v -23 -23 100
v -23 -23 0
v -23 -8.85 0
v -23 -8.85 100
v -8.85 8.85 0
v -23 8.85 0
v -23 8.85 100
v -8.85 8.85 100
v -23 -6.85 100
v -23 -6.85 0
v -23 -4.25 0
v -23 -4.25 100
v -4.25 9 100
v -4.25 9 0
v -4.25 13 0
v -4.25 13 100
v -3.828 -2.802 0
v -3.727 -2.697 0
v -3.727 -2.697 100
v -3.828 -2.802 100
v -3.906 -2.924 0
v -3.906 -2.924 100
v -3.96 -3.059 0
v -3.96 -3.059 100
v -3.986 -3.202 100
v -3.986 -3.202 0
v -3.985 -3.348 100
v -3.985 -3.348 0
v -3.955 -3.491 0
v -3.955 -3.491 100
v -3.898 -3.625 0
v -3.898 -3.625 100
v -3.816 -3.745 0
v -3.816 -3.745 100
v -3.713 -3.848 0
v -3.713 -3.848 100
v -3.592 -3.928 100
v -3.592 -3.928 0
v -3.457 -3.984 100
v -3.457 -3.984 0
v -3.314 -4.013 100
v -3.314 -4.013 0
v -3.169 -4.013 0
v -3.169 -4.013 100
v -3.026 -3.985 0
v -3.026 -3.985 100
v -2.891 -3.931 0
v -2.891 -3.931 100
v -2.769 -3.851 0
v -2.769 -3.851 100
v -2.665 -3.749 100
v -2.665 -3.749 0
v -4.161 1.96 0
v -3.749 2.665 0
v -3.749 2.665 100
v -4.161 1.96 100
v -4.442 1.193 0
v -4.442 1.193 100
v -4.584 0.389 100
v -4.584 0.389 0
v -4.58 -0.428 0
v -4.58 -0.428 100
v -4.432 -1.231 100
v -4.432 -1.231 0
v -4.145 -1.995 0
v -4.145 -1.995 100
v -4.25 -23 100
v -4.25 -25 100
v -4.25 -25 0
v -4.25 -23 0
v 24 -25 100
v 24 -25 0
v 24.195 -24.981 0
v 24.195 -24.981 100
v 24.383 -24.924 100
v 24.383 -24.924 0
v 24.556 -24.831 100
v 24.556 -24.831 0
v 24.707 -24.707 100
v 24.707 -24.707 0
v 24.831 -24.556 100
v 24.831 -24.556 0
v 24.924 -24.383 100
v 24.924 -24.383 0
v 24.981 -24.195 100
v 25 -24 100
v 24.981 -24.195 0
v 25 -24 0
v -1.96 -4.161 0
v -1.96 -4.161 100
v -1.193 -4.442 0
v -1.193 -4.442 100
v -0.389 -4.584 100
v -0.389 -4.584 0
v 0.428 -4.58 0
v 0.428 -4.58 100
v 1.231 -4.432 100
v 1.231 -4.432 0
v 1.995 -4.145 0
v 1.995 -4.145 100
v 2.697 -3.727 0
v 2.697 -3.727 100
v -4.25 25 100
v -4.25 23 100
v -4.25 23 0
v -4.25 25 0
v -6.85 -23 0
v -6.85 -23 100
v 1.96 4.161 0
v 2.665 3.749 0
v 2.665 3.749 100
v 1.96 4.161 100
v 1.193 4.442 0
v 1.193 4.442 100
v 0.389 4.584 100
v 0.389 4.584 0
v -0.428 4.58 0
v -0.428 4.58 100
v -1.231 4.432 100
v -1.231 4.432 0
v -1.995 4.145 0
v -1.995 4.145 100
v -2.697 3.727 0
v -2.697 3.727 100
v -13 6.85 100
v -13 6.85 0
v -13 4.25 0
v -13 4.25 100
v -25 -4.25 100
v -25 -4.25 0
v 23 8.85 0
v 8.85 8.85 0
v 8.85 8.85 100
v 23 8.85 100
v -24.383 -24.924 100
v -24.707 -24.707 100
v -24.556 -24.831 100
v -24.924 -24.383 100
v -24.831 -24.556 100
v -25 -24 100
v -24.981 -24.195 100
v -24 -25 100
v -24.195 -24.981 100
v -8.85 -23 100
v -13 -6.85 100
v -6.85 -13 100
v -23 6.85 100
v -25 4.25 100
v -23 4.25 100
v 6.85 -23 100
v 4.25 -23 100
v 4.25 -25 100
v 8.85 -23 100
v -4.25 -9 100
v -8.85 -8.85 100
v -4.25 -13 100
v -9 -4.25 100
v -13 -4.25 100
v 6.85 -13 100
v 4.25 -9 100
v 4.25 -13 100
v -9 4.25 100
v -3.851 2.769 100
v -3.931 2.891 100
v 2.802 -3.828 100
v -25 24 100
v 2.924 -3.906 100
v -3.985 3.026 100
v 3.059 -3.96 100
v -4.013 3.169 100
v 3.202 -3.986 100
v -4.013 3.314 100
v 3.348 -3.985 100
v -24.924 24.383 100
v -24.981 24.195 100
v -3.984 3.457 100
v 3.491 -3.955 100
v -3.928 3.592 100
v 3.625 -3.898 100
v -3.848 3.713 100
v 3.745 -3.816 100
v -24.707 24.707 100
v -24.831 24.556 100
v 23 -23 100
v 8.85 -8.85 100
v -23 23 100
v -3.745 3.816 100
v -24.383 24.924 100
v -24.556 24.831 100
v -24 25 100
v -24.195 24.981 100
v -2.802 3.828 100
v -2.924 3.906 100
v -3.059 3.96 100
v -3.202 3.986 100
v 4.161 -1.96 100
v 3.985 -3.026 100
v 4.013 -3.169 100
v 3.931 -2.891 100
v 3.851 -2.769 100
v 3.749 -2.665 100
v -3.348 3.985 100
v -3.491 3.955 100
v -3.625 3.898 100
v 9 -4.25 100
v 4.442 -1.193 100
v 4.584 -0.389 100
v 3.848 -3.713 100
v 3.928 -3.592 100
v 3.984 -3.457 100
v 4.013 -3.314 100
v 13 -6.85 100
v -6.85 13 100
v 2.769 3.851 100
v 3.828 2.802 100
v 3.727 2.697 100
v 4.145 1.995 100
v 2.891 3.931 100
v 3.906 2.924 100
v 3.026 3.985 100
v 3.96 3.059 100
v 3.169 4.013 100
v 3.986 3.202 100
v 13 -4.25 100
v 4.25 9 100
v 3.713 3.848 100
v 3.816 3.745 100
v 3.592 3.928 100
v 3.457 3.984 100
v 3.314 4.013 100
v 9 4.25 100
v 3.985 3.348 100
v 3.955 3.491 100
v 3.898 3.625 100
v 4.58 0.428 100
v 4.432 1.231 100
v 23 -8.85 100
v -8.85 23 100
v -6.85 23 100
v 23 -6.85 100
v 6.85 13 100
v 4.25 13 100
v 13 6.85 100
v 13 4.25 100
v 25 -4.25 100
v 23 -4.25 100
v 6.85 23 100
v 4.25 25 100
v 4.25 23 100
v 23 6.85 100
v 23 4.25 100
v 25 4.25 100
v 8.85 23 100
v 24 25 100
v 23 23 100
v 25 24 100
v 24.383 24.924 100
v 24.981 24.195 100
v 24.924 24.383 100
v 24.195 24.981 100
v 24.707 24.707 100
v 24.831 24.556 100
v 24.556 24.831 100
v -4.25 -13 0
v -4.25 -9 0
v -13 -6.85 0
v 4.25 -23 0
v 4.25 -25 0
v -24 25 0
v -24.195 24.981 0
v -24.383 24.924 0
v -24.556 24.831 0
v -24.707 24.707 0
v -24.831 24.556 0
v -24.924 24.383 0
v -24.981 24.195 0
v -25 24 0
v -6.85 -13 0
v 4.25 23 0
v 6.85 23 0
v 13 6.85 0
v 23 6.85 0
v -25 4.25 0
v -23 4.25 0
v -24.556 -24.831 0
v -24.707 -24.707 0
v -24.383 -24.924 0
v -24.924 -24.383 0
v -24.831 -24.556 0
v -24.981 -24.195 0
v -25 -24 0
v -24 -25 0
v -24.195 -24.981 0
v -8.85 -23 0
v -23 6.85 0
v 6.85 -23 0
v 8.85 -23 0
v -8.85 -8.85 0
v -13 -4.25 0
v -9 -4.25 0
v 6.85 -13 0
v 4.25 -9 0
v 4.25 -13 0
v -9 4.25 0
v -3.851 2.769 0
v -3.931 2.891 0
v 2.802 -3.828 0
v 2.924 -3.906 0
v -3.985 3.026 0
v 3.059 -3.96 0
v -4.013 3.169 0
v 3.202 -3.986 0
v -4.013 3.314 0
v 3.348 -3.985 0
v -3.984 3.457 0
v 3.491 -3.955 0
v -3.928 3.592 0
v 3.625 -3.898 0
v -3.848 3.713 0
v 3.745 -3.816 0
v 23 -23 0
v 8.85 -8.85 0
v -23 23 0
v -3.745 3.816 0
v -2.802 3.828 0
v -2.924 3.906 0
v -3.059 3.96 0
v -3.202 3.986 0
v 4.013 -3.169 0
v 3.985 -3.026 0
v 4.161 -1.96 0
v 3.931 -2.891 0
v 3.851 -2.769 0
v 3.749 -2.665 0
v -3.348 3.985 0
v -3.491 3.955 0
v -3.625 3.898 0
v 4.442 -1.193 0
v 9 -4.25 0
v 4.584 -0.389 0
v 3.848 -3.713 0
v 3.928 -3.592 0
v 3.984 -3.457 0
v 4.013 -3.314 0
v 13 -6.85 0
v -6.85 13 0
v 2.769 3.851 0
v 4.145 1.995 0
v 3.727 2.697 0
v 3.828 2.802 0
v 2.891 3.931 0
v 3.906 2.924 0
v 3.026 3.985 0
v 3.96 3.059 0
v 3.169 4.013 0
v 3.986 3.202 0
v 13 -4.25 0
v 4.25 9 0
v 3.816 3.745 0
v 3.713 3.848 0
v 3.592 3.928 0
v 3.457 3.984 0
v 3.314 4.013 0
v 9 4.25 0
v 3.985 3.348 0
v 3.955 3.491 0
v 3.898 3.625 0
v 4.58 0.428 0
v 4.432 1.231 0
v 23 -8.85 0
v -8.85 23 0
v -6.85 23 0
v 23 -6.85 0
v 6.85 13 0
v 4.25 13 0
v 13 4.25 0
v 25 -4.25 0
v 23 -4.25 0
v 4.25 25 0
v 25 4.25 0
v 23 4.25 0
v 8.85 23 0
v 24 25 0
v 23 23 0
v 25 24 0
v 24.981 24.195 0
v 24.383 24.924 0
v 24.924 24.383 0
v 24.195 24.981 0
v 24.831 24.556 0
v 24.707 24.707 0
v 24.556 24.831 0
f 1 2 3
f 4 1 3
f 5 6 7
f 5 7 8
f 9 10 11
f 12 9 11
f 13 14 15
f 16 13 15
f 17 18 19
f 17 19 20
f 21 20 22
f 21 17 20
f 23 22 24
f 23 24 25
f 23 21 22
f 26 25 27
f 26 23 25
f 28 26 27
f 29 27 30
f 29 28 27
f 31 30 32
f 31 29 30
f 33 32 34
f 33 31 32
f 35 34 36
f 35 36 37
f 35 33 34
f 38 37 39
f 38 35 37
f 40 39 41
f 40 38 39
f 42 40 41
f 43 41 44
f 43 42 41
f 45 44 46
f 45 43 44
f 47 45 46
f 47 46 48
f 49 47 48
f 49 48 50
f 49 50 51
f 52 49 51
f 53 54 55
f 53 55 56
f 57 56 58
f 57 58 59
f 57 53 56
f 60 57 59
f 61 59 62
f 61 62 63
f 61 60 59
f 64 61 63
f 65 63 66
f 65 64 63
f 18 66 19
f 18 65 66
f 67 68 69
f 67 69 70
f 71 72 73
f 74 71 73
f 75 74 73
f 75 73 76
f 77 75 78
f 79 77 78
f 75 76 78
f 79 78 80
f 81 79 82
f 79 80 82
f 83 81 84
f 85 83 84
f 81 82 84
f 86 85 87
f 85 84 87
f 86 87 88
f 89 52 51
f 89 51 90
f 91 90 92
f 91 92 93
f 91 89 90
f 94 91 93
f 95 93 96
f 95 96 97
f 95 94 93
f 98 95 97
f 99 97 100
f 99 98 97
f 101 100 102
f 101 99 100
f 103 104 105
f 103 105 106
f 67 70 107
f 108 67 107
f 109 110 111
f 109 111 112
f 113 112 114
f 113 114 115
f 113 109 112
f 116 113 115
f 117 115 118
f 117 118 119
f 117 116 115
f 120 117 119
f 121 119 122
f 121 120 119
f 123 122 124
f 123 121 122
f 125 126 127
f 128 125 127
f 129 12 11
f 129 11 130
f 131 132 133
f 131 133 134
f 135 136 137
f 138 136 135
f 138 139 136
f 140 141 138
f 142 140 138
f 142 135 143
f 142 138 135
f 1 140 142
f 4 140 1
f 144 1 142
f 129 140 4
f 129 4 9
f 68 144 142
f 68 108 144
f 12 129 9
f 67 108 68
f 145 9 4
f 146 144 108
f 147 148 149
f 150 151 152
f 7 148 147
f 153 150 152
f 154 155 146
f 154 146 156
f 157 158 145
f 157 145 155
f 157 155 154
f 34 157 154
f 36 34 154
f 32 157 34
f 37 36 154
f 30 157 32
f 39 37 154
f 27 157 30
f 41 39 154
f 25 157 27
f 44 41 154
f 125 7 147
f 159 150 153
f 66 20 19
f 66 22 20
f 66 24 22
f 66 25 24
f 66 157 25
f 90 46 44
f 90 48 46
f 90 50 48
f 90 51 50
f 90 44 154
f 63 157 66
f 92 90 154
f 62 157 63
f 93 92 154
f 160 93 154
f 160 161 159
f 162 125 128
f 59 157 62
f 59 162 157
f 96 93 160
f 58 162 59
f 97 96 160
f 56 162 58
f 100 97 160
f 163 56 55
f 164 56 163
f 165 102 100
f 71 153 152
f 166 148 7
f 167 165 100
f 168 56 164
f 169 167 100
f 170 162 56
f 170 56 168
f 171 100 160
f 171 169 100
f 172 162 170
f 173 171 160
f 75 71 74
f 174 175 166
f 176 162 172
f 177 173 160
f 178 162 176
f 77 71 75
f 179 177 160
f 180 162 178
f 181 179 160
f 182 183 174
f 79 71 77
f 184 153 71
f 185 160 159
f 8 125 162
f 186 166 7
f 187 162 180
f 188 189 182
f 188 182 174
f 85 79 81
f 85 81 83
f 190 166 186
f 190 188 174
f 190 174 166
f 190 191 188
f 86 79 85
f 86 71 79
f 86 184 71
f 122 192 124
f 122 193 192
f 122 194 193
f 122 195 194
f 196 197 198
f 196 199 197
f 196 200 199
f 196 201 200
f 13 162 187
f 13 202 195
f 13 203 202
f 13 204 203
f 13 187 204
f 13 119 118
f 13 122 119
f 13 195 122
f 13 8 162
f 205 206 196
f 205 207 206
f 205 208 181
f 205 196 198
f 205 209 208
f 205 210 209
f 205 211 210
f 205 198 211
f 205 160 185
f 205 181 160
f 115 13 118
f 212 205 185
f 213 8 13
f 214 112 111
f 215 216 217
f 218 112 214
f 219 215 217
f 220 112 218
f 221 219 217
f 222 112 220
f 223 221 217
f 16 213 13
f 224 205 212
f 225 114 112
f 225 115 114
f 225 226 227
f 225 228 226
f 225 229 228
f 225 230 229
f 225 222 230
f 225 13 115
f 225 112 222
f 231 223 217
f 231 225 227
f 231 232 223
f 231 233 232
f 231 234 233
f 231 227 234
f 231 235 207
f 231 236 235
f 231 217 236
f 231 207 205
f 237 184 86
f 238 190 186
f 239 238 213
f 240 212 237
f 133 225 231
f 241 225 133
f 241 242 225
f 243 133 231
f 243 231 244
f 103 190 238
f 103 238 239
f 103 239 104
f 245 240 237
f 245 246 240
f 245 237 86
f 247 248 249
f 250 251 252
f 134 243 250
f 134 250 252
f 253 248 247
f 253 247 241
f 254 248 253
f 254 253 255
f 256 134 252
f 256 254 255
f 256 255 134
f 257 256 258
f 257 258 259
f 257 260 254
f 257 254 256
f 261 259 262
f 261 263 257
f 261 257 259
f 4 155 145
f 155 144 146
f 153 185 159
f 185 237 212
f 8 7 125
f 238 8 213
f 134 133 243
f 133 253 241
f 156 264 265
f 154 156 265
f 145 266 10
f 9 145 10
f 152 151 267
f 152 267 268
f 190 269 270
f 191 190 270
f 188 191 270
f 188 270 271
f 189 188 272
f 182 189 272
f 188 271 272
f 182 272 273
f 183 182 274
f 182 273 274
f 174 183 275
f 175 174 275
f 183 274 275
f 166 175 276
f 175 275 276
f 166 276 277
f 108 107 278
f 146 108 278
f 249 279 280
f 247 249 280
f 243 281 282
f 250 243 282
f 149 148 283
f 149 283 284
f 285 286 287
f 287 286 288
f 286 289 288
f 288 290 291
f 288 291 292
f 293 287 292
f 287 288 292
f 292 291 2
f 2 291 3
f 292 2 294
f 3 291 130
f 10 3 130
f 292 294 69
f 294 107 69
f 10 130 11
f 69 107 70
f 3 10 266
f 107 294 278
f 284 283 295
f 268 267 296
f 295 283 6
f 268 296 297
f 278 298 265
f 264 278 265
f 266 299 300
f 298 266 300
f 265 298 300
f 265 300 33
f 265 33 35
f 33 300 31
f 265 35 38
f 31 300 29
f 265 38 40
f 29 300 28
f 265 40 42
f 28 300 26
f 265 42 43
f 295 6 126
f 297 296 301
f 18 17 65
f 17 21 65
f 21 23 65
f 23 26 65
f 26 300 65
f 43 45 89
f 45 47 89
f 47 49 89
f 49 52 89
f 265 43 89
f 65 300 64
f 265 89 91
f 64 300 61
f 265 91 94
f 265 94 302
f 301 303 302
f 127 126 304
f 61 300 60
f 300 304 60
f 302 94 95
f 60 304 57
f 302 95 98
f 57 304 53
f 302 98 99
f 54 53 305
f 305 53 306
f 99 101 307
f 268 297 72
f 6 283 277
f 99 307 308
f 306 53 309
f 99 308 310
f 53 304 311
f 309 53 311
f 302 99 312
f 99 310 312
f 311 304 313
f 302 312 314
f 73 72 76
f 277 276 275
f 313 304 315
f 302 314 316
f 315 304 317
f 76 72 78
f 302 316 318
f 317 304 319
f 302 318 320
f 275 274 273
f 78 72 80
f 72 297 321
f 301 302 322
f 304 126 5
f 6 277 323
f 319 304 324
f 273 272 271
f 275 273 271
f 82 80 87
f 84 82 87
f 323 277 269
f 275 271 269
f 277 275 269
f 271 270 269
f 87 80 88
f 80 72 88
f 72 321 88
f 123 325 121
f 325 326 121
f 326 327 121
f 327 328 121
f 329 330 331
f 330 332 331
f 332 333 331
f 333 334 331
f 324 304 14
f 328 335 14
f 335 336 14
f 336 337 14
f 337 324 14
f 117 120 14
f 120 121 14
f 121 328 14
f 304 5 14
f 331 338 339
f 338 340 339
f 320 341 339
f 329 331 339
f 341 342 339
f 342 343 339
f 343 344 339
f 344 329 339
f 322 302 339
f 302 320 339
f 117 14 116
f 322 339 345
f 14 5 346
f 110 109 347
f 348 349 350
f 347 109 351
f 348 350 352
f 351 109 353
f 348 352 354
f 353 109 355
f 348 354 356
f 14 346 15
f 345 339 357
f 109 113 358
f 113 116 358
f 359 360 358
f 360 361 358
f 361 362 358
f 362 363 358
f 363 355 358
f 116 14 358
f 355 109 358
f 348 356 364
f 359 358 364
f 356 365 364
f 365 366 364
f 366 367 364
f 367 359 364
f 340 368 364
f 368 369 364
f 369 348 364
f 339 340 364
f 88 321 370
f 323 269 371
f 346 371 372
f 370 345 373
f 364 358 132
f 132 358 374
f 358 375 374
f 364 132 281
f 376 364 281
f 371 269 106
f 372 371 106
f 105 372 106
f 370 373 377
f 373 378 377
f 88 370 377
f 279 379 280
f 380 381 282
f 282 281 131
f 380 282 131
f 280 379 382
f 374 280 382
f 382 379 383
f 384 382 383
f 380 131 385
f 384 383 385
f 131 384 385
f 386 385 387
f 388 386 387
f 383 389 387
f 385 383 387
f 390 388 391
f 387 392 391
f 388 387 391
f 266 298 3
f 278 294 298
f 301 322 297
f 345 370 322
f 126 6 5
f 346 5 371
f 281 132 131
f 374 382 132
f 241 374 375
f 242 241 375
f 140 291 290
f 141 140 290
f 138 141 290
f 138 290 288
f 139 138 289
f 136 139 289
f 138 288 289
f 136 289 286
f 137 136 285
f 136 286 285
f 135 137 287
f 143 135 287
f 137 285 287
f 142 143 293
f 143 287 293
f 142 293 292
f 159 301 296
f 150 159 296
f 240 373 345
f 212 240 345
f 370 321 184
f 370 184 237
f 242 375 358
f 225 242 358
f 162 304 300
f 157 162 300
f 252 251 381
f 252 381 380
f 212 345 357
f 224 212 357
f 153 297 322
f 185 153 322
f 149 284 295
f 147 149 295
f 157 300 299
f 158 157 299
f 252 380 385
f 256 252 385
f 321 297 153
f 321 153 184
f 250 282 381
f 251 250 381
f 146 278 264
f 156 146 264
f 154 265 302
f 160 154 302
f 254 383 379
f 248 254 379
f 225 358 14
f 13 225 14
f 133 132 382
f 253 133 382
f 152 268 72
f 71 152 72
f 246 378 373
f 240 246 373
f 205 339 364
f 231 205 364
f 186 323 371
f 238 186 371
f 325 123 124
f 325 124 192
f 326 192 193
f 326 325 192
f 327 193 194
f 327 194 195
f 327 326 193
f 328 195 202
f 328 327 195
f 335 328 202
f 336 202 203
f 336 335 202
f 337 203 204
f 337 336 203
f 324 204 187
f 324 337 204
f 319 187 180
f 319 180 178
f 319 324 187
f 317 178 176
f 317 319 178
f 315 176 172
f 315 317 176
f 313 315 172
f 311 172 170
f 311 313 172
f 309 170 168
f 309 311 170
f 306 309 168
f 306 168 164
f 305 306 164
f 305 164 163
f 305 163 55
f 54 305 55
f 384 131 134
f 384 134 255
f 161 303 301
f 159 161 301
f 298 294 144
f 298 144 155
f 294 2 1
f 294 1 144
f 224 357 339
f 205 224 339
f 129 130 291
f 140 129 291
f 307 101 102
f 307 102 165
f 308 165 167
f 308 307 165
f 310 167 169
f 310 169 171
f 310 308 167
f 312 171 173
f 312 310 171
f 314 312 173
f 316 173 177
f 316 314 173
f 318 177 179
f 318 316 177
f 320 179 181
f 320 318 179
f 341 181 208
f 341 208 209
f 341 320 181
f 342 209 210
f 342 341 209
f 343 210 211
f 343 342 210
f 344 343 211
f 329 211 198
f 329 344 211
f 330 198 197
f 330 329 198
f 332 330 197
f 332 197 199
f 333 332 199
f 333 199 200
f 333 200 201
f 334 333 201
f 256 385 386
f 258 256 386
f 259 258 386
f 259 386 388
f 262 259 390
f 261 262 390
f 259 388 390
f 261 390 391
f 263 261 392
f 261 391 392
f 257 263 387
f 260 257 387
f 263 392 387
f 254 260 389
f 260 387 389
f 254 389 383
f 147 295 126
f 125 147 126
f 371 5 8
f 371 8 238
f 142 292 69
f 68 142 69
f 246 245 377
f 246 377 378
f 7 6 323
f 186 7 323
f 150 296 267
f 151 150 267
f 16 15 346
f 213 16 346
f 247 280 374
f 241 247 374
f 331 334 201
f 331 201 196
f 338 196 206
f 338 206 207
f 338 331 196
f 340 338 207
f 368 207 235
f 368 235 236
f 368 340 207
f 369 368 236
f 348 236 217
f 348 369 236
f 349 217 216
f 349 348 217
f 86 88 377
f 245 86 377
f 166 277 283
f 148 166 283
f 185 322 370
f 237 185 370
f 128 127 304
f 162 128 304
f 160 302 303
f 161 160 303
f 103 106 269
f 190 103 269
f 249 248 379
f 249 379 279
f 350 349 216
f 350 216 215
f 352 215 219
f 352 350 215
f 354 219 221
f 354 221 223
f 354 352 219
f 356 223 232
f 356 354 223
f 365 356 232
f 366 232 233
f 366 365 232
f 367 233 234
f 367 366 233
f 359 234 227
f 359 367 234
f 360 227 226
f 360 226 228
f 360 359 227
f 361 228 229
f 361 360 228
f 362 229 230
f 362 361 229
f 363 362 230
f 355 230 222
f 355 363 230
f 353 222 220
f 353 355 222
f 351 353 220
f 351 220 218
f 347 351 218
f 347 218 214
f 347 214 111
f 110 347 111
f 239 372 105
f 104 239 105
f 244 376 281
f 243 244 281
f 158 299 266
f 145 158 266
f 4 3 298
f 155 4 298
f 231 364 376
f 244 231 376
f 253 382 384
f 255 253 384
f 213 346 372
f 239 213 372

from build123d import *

# Parameters (mm, degrees)
SKETCH_1_W      = 14.15
SKETCH_1_H      = 14.15
EXTRUDE_1_DEPTH = 100


with BuildPart() as part:
    # 草图1 → 凸台-拉伸1 (new body)
    with BuildSketch(Plane.XY):
        with BuildLine():
            Line((-25, 24), (-25, 4.25))
            Line((-25, 4.25), (-23, 4.25))
            Line((-23, 4.25), (-23, 6.85))
            Line((-23, 6.85), (-13, 6.85))
            Line((-13, 6.85), (-13, 4.25))
            Line((-13, 4.25), (-9, 4.25))
            Line((-9, 4.25), (-9, -4.25))
            Line((-9, -4.25), (-13, -4.25))
            Line((-13, -4.25), (-13, -6.85))
            Line((-13, -6.85), (-23, -6.85))
            Line((-23, -6.85), (-23, -4.25))
            Line((-23, -4.25), (-25, -4.25))
            Line((-25, -4.25), (-25, -24))
            ThreePointArc((-25, -24), (-24.707106781, -24.707106781), (-24, -25))
            Line((-24, -25), (-4.25, -25))
            Line((-4.25, -25), (-4.25, -23))
            Line((-4.25, -23), (-6.85, -23))
            Line((-6.85, -23), (-6.85, -13))
            Line((-6.85, -13), (-4.25, -13))
            Line((-4.25, -13), (-4.25, -9))
            Line((-4.25, -9), (4.25, -9))
            Line((4.25, -9), (4.25, -13))
            Line((4.25, -13), (6.85, -13))
            Line((6.85, -13), (6.85, -23))
            Line((6.85, -23), (4.25, -23))
            Line((4.25, -23), (4.25, -25))
            Line((4.25, -25), (24, -25))
            ThreePointArc((24, -25), (24.707106781, -24.707106781), (25, -24))
            Line((25, -24), (25, -4.25))
            Line((25, -4.25), (23, -4.25))
            Line((23, -4.25), (23, -6.85))
            Line((23, -6.85), (13, -6.85))
            Line((13, -6.85), (13, -4.25))
            Line((13, -4.25), (9, -4.25))
            Line((9, -4.25), (9, 4.25))
            Line((9, 4.25), (13, 4.25))
            Line((13, 4.25), (13, 6.85))
            Line((13, 6.85), (23, 6.85))
            Line((23, 6.85), (23, 4.25))
            Line((23, 4.25), (25, 4.25))
            Line((25, 4.25), (25, 24))
            ThreePointArc((25, 24), (24.707106781, 24.707106781), (24, 25))
            Line((24, 25), (4.25, 25))
            Line((4.25, 25), (4.25, 23))
            Line((4.25, 23), (6.85, 23))
            Line((6.85, 23), (6.85, 13))
            Line((6.85, 13), (4.25, 13))
            Line((4.25, 13), (4.25, 9))
            Line((4.25, 9), (-4.25, 9))
            Line((-4.25, 9), (-4.25, 13))
            Line((-4.25, 13), (-6.85, 13))
            Line((-6.85, 13), (-6.85, 23))
            Line((-6.85, 23), (-4.25, 23))
            Line((-4.25, 23), (-4.25, 25))
            Line((-4.25, 25), (-24, 25))
            ThreePointArc((-24, 25), (-24.707106781, 24.707106781), (-25, 24))
        make_face()
        with Locations((15.925, 15.925)):
            Rectangle(SKETCH_1_W, SKETCH_1_H, mode=Mode.SUBTRACT)
        with Locations((15.925, -15.925)):
            Rectangle(SKETCH_1_W, SKETCH_1_H, mode=Mode.SUBTRACT)
        with Locations((-15.925, -15.925)):
            Rectangle(SKETCH_1_W, SKETCH_1_H, mode=Mode.SUBTRACT)
        with Locations((-15.925, 15.925)):
            Rectangle(SKETCH_1_W, SKETCH_1_H, mode=Mode.SUBTRACT)
        with BuildLine():
            ThreePointArc((-3.749249273, 2.665169767), (-4.599959429, -0.019319679), (-3.726730147, -2.696568636))
            ThreePointArc((-3.726730147, -2.696568636), (-3.767099489, -3.798876339), (-2.665169767, -3.749249273))
            ThreePointArc((-2.665169767, -3.749249273), (0.019319679, -4.599959429), (2.696568636, -3.726730147))
            ThreePointArc((2.696568636, -3.726730147), (3.798876339, -3.767099489), (3.749249273, -2.665169767))
            ThreePointArc((3.749249273, -2.665169767), (4.599959429, 0.019319679), (3.726730147, 2.696568636))
            ThreePointArc((3.726730147, 2.696568636), (3.767099489, 3.798876339), (2.665169767, 3.749249273))
            ThreePointArc((2.665169767, 3.749249273), (-0.019319679, 4.599959429), (-2.696568636, 3.726730147))
            ThreePointArc((-2.696568636, 3.726730147), (-3.798876339, 3.767099489), (-3.749249273, 2.665169767))
        make_face(mode=Mode.SUBTRACT)
    extrude(amount=EXTRUDE_1_DEPTH)


solid = part.part
